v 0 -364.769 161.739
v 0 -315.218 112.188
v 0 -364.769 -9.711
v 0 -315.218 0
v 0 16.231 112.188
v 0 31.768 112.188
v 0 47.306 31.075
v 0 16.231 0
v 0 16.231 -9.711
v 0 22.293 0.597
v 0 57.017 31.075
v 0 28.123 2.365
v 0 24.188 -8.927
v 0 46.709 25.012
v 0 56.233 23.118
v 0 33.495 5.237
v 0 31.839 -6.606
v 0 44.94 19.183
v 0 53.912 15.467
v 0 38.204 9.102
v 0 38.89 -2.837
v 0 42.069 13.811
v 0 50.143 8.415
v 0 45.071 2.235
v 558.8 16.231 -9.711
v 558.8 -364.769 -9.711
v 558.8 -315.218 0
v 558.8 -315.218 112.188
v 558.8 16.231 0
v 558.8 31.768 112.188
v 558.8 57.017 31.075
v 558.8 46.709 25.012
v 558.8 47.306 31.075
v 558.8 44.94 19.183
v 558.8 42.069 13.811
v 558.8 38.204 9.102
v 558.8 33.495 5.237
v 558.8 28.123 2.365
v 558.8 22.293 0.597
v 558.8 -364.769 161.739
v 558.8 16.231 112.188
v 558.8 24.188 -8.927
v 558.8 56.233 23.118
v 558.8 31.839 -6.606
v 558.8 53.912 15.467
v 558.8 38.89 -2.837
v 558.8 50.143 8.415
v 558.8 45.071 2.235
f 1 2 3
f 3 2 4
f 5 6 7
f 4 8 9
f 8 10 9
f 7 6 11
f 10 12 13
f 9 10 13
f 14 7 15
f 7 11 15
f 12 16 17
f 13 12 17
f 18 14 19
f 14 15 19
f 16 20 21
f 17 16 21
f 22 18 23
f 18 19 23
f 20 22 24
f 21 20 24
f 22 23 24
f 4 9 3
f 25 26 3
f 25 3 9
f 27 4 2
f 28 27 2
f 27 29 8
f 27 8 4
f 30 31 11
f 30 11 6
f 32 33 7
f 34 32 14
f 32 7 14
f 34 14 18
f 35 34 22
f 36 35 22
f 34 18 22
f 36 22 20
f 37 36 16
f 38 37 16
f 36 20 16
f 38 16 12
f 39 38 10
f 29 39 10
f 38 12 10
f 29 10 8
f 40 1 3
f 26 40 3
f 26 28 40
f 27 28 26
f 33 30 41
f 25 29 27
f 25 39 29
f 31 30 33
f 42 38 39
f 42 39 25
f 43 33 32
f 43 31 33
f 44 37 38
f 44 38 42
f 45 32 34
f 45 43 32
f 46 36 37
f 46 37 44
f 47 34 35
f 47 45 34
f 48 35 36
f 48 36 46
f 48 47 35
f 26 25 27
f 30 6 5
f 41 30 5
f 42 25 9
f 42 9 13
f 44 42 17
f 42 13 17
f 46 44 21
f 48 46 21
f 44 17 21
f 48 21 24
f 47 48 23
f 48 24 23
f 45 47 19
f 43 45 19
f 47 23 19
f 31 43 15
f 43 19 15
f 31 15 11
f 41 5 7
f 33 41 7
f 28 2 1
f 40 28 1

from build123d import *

# Parameters (mm, degrees)
BOSS_EXTRUDE1_DEPTH = 558.8


with BuildPart() as part:
    # Sketch1 → Boss-Extrude1 (new body)
    with BuildSketch(Plane(origin=(0, 0, 0), x_dir=(0, 0, -1), z_dir=(1, 0, 0))):
        with BuildLine():
            Line((0, 16.231012583), (0, -315.218136756))
            Line((0, -315.218136756), (-112.188138154, -315.218136756))
            Line((-112.188138154, -315.218136756), (-161.738988814, -364.768987417))
            Line((-161.738988814, -364.768987417), (0, -364.768987417))
            Line((0, -364.768987417), (9.710862229, -364.768987417))
            Line((9.710862229, -364.768987417), (9.710862229, 16.231012583))
            ThreePointArc((9.710862229, 16.231012583), (-2.234969693, 45.070802024), (-31.074759134, 57.016633947))
            Line((-31.074759134, 57.016633947), (-112.188138154, 31.76839215))
            Line((-112.188138154, 31.76839215), (-112.188138154, 16.231012583))
            Line((-112.188138154, 16.231012583), (-31.074759134, 47.305771717))
            ThreePointArc((-31.074759134, 47.305771717), (-9.101586227, 38.204185491), (0, 16.231012583))
        make_face()
    extrude(amount=BOSS_EXTRUDE1_DEPTH)


solid = part.part
